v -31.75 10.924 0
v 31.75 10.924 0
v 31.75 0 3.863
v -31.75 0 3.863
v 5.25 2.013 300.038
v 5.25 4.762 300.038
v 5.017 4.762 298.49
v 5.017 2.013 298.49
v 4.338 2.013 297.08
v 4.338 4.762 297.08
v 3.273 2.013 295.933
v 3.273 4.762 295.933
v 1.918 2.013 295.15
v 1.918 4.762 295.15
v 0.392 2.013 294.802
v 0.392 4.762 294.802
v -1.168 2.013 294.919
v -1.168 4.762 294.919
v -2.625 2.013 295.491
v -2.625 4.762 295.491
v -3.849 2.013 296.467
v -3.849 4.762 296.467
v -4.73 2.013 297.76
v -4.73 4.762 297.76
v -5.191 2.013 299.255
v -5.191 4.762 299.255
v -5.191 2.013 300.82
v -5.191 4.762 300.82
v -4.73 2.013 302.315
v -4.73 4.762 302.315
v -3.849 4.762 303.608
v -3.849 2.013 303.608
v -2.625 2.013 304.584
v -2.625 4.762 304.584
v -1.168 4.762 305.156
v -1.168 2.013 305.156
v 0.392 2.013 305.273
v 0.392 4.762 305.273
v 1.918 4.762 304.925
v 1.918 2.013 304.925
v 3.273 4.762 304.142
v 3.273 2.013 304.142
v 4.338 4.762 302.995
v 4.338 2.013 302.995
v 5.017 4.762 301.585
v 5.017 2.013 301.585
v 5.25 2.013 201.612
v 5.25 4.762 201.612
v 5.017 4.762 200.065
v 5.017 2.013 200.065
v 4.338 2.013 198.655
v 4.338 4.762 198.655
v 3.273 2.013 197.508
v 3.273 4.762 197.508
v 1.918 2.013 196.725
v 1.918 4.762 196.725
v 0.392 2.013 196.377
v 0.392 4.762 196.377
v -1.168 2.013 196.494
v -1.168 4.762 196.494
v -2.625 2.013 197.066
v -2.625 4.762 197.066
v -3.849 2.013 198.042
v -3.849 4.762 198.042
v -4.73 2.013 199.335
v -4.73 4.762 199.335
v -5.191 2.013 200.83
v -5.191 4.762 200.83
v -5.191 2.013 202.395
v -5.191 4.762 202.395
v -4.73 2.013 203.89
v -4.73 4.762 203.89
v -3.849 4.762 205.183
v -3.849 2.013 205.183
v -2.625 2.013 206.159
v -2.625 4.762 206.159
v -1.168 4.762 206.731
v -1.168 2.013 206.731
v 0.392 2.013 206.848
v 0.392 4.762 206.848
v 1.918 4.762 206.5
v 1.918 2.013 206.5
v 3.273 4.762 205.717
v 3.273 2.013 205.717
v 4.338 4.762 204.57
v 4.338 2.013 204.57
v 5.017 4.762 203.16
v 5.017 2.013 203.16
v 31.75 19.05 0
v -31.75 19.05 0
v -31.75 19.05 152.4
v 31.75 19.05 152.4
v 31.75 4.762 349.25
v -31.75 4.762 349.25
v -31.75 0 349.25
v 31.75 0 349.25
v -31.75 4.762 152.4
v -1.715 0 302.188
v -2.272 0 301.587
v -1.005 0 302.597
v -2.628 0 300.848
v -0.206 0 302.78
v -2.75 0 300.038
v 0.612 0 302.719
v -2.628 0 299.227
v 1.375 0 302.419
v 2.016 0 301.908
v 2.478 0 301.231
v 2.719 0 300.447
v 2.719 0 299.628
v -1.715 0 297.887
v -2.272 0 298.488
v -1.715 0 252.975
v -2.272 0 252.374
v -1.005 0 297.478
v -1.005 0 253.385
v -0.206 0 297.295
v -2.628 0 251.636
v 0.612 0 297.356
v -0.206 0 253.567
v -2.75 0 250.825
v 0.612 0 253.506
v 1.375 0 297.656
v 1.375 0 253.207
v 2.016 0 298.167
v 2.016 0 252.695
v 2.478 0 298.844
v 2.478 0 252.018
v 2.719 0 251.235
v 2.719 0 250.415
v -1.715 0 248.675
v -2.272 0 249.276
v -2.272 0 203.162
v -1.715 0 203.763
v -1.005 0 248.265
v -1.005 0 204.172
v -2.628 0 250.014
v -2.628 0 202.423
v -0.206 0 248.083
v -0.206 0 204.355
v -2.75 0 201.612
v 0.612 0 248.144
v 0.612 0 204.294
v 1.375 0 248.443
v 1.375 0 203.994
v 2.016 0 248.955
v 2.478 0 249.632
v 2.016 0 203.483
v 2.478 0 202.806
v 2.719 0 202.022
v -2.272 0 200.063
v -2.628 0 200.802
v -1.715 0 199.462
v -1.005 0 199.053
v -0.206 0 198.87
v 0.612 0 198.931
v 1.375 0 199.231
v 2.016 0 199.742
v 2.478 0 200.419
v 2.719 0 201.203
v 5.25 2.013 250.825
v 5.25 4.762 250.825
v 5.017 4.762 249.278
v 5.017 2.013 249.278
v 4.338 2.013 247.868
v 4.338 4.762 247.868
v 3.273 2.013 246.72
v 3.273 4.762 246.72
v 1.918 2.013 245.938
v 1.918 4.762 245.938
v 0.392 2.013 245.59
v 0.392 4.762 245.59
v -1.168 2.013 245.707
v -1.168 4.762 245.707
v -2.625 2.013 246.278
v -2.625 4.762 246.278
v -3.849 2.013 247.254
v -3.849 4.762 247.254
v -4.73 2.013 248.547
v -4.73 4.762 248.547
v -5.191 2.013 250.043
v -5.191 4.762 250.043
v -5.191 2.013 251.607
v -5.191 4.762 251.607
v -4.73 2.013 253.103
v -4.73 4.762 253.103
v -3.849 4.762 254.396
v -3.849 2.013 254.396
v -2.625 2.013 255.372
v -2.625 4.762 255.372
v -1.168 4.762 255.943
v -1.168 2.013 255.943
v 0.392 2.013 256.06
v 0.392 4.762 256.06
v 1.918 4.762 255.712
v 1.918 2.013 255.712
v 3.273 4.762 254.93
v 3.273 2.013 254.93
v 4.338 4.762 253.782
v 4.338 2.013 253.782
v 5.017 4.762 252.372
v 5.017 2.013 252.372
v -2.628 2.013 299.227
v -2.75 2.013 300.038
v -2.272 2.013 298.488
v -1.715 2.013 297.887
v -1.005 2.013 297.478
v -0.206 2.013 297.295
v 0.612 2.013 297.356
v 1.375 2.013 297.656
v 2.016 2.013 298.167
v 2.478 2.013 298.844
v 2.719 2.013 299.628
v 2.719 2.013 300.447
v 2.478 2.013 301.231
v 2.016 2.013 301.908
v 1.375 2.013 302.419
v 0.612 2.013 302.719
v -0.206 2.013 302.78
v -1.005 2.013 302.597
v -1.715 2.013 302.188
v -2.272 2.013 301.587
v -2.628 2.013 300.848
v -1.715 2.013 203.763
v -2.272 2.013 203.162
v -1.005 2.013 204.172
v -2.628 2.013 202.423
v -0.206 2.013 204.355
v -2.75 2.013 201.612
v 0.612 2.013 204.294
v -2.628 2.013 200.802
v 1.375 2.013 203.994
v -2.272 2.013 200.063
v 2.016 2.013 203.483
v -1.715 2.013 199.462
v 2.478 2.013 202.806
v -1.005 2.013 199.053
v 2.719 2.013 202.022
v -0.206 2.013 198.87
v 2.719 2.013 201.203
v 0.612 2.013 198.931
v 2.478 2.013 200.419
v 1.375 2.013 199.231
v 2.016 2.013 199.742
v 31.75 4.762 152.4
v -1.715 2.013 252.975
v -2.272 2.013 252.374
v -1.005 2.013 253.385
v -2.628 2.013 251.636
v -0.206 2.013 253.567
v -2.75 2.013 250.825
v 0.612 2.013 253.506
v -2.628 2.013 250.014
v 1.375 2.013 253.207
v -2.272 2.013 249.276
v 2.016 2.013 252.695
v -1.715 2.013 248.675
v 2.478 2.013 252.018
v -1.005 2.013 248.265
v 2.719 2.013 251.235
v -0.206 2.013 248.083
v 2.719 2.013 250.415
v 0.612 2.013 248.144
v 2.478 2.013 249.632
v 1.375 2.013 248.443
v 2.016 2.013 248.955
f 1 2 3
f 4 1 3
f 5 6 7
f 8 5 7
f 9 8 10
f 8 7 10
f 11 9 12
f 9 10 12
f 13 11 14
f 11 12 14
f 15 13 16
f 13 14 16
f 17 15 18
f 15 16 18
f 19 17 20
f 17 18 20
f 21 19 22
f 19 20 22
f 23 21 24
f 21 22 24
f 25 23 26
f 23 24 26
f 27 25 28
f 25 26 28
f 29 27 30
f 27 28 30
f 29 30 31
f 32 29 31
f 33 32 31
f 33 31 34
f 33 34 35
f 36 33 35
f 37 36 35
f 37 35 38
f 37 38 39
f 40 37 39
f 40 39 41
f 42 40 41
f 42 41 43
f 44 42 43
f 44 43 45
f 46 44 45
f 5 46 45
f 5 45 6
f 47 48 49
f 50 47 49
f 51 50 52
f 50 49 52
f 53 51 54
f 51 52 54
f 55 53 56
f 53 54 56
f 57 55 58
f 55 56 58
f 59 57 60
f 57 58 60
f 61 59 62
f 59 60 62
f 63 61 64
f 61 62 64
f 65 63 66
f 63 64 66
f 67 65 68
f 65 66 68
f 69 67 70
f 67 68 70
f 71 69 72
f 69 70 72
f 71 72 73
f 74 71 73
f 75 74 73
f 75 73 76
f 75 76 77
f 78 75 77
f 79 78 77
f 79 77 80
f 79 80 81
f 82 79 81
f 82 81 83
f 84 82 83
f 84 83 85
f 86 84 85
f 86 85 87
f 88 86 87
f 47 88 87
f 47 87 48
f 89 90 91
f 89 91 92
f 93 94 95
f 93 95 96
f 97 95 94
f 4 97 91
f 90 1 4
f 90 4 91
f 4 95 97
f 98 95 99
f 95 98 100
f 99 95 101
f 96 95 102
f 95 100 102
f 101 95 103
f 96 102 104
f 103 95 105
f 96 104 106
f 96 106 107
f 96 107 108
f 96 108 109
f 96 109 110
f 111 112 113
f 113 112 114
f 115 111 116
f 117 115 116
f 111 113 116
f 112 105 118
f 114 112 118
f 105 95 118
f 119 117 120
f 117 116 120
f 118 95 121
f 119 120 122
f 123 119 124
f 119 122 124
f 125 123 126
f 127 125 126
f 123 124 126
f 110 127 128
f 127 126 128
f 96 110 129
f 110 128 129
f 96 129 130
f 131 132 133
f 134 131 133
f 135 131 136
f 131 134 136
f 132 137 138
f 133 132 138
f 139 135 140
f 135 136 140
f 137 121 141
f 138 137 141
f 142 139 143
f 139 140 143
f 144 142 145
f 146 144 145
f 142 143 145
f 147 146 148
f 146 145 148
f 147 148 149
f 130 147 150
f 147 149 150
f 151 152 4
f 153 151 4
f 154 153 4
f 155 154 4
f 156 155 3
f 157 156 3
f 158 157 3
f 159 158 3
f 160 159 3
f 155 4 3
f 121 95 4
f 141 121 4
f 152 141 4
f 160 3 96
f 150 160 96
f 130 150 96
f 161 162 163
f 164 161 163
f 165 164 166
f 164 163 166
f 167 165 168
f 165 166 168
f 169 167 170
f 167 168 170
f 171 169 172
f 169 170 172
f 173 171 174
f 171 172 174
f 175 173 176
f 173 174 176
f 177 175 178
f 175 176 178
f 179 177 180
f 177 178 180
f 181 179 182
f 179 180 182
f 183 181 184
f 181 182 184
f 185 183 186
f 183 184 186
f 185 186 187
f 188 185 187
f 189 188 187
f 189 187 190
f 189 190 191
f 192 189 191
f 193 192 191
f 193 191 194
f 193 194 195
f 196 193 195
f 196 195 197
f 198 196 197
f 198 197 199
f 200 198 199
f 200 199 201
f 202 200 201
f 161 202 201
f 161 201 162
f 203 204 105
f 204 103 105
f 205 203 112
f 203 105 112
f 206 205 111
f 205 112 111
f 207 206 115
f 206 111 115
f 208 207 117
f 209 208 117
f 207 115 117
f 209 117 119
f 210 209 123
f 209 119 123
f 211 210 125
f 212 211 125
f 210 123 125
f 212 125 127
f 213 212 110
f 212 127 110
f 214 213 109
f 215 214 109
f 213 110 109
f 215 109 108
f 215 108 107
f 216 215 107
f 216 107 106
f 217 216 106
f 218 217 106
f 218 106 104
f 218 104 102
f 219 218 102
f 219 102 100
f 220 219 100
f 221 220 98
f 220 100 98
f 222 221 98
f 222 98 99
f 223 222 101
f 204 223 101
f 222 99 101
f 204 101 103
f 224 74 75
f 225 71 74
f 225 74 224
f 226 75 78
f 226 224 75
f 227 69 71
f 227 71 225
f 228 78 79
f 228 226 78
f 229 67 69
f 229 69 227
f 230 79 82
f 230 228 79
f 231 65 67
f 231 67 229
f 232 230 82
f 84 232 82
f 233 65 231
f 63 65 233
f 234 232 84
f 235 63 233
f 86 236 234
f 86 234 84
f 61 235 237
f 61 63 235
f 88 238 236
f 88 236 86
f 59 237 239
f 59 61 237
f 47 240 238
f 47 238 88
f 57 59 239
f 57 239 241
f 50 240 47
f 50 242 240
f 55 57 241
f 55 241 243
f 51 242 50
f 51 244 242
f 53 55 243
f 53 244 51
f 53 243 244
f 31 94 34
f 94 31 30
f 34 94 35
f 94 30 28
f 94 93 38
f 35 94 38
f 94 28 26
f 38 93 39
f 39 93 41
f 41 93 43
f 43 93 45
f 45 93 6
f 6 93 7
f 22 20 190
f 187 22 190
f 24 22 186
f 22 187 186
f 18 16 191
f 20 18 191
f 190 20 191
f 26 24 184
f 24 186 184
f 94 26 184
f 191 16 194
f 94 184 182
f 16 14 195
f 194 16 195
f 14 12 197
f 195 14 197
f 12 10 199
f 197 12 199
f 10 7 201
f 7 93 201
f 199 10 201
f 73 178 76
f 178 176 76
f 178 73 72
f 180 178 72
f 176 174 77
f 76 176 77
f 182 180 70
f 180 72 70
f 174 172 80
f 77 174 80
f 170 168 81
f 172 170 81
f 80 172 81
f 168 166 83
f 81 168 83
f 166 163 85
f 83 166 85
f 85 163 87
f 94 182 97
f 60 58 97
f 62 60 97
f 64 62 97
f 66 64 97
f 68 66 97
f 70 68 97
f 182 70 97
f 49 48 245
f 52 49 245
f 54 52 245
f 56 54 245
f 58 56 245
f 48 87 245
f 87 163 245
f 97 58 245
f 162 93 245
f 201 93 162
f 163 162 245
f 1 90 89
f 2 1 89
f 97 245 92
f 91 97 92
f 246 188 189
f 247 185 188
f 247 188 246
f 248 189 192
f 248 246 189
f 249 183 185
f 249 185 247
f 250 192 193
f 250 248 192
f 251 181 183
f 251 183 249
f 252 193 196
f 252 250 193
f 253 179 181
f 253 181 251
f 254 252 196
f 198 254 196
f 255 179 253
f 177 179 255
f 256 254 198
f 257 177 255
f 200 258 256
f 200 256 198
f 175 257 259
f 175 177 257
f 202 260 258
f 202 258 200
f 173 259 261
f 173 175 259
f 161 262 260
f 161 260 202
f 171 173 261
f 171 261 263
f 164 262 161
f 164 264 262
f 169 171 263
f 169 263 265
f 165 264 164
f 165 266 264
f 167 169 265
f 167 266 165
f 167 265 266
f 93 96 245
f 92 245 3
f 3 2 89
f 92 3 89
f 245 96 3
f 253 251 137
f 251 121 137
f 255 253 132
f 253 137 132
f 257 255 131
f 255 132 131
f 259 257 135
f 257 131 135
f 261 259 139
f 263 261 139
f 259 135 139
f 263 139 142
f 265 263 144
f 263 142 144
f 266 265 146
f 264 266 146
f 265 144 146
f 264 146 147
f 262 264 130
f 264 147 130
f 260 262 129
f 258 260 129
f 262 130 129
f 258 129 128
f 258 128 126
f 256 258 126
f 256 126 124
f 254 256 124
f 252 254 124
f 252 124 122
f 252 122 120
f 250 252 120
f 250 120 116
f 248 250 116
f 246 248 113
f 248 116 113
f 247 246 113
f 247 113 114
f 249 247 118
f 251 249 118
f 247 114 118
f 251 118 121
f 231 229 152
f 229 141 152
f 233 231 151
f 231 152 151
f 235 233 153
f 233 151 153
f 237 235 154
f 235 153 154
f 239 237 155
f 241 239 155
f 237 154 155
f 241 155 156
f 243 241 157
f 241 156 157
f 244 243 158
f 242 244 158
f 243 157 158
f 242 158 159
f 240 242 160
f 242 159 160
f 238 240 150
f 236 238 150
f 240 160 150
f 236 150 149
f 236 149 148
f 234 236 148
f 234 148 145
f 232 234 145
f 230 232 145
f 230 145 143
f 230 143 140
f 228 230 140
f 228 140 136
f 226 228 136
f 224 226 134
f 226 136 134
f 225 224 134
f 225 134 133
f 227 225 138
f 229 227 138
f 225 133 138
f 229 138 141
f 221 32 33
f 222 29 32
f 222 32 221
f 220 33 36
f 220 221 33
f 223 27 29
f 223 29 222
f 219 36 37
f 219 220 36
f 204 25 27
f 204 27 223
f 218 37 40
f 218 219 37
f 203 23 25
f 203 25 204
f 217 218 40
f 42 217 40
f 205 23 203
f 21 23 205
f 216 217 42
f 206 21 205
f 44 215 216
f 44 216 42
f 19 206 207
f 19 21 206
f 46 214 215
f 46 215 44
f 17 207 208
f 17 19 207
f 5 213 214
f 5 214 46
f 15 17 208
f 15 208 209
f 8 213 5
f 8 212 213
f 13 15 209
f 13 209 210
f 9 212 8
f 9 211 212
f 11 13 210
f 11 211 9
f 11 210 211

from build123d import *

# Parameters (mm, degrees)
SKETCH1_W                       = 63.5
SKETCH1_H                       = 19.05
BOSS_EXTRUDE1_DEPTH             = 349.25
SKETCH3_W                       = 196.85
SKETCH3_H                       = 14.2875
CUT_EXTRUDE1_DEPTH              = 356.486589058
CUT_EXTRUDE2_DEPTH              = 356.486589058
CBORE_FOR_M5_SBHCS1_D           = 5.5
CBORE_FOR_M5_SBHCS1_CBORE_D     = 10.5
CBORE_FOR_M5_SBHCS1_CBORE_DEPTH = 2.75


with BuildPart() as part:
    # Sketch1 → Boss-Extrude1 (new body)
    with BuildSketch(Plane.XY):
        with Locations((0, 9.525)):
            Rectangle(SKETCH1_W, SKETCH1_H)
    extrude(amount=BOSS_EXTRUDE1_DEPTH)

    # Sketch3 → Cut-Extrude1 (cut, through all)
    with BuildSketch(Plane(origin=(31.75, 0, 0), x_dir=(0, 0, -1), z_dir=(1, 0, 0))):
        with Locations((-250.825, 11.90625)):
            Rectangle(SKETCH3_W, SKETCH3_H)
    extrude(amount=-CUT_EXTRUDE1_DEPTH, mode=Mode.SUBTRACT)

    # Sketch14 → Cut-Extrude2 (cut, through all)
    with BuildSketch(Plane(origin=(31.75, 0, 0), x_dir=(0, 0, -1), z_dir=(1, 0, 0))):
        Polygon((-3.863258779, 0), (0, 0), (0, 10.924113624), align=None)
    extrude(amount=-CUT_EXTRUDE2_DEPTH, mode=Mode.SUBTRACT)

    # CBORE for M5 SBHCS1 (through all)
    with Locations(Plane(origin=(0, 4.7625, 0), x_dir=(1, 0, 0), z_dir=(0, 1, 0))):
        with Locations((0, -201.6125), (0, -250.825), (0, -300.0375)):
            CounterBoreHole(CBORE_FOR_M5_SBHCS1_D / 2, CBORE_FOR_M5_SBHCS1_CBORE_D / 2, CBORE_FOR_M5_SBHCS1_CBORE_DEPTH)


solid = part.part
